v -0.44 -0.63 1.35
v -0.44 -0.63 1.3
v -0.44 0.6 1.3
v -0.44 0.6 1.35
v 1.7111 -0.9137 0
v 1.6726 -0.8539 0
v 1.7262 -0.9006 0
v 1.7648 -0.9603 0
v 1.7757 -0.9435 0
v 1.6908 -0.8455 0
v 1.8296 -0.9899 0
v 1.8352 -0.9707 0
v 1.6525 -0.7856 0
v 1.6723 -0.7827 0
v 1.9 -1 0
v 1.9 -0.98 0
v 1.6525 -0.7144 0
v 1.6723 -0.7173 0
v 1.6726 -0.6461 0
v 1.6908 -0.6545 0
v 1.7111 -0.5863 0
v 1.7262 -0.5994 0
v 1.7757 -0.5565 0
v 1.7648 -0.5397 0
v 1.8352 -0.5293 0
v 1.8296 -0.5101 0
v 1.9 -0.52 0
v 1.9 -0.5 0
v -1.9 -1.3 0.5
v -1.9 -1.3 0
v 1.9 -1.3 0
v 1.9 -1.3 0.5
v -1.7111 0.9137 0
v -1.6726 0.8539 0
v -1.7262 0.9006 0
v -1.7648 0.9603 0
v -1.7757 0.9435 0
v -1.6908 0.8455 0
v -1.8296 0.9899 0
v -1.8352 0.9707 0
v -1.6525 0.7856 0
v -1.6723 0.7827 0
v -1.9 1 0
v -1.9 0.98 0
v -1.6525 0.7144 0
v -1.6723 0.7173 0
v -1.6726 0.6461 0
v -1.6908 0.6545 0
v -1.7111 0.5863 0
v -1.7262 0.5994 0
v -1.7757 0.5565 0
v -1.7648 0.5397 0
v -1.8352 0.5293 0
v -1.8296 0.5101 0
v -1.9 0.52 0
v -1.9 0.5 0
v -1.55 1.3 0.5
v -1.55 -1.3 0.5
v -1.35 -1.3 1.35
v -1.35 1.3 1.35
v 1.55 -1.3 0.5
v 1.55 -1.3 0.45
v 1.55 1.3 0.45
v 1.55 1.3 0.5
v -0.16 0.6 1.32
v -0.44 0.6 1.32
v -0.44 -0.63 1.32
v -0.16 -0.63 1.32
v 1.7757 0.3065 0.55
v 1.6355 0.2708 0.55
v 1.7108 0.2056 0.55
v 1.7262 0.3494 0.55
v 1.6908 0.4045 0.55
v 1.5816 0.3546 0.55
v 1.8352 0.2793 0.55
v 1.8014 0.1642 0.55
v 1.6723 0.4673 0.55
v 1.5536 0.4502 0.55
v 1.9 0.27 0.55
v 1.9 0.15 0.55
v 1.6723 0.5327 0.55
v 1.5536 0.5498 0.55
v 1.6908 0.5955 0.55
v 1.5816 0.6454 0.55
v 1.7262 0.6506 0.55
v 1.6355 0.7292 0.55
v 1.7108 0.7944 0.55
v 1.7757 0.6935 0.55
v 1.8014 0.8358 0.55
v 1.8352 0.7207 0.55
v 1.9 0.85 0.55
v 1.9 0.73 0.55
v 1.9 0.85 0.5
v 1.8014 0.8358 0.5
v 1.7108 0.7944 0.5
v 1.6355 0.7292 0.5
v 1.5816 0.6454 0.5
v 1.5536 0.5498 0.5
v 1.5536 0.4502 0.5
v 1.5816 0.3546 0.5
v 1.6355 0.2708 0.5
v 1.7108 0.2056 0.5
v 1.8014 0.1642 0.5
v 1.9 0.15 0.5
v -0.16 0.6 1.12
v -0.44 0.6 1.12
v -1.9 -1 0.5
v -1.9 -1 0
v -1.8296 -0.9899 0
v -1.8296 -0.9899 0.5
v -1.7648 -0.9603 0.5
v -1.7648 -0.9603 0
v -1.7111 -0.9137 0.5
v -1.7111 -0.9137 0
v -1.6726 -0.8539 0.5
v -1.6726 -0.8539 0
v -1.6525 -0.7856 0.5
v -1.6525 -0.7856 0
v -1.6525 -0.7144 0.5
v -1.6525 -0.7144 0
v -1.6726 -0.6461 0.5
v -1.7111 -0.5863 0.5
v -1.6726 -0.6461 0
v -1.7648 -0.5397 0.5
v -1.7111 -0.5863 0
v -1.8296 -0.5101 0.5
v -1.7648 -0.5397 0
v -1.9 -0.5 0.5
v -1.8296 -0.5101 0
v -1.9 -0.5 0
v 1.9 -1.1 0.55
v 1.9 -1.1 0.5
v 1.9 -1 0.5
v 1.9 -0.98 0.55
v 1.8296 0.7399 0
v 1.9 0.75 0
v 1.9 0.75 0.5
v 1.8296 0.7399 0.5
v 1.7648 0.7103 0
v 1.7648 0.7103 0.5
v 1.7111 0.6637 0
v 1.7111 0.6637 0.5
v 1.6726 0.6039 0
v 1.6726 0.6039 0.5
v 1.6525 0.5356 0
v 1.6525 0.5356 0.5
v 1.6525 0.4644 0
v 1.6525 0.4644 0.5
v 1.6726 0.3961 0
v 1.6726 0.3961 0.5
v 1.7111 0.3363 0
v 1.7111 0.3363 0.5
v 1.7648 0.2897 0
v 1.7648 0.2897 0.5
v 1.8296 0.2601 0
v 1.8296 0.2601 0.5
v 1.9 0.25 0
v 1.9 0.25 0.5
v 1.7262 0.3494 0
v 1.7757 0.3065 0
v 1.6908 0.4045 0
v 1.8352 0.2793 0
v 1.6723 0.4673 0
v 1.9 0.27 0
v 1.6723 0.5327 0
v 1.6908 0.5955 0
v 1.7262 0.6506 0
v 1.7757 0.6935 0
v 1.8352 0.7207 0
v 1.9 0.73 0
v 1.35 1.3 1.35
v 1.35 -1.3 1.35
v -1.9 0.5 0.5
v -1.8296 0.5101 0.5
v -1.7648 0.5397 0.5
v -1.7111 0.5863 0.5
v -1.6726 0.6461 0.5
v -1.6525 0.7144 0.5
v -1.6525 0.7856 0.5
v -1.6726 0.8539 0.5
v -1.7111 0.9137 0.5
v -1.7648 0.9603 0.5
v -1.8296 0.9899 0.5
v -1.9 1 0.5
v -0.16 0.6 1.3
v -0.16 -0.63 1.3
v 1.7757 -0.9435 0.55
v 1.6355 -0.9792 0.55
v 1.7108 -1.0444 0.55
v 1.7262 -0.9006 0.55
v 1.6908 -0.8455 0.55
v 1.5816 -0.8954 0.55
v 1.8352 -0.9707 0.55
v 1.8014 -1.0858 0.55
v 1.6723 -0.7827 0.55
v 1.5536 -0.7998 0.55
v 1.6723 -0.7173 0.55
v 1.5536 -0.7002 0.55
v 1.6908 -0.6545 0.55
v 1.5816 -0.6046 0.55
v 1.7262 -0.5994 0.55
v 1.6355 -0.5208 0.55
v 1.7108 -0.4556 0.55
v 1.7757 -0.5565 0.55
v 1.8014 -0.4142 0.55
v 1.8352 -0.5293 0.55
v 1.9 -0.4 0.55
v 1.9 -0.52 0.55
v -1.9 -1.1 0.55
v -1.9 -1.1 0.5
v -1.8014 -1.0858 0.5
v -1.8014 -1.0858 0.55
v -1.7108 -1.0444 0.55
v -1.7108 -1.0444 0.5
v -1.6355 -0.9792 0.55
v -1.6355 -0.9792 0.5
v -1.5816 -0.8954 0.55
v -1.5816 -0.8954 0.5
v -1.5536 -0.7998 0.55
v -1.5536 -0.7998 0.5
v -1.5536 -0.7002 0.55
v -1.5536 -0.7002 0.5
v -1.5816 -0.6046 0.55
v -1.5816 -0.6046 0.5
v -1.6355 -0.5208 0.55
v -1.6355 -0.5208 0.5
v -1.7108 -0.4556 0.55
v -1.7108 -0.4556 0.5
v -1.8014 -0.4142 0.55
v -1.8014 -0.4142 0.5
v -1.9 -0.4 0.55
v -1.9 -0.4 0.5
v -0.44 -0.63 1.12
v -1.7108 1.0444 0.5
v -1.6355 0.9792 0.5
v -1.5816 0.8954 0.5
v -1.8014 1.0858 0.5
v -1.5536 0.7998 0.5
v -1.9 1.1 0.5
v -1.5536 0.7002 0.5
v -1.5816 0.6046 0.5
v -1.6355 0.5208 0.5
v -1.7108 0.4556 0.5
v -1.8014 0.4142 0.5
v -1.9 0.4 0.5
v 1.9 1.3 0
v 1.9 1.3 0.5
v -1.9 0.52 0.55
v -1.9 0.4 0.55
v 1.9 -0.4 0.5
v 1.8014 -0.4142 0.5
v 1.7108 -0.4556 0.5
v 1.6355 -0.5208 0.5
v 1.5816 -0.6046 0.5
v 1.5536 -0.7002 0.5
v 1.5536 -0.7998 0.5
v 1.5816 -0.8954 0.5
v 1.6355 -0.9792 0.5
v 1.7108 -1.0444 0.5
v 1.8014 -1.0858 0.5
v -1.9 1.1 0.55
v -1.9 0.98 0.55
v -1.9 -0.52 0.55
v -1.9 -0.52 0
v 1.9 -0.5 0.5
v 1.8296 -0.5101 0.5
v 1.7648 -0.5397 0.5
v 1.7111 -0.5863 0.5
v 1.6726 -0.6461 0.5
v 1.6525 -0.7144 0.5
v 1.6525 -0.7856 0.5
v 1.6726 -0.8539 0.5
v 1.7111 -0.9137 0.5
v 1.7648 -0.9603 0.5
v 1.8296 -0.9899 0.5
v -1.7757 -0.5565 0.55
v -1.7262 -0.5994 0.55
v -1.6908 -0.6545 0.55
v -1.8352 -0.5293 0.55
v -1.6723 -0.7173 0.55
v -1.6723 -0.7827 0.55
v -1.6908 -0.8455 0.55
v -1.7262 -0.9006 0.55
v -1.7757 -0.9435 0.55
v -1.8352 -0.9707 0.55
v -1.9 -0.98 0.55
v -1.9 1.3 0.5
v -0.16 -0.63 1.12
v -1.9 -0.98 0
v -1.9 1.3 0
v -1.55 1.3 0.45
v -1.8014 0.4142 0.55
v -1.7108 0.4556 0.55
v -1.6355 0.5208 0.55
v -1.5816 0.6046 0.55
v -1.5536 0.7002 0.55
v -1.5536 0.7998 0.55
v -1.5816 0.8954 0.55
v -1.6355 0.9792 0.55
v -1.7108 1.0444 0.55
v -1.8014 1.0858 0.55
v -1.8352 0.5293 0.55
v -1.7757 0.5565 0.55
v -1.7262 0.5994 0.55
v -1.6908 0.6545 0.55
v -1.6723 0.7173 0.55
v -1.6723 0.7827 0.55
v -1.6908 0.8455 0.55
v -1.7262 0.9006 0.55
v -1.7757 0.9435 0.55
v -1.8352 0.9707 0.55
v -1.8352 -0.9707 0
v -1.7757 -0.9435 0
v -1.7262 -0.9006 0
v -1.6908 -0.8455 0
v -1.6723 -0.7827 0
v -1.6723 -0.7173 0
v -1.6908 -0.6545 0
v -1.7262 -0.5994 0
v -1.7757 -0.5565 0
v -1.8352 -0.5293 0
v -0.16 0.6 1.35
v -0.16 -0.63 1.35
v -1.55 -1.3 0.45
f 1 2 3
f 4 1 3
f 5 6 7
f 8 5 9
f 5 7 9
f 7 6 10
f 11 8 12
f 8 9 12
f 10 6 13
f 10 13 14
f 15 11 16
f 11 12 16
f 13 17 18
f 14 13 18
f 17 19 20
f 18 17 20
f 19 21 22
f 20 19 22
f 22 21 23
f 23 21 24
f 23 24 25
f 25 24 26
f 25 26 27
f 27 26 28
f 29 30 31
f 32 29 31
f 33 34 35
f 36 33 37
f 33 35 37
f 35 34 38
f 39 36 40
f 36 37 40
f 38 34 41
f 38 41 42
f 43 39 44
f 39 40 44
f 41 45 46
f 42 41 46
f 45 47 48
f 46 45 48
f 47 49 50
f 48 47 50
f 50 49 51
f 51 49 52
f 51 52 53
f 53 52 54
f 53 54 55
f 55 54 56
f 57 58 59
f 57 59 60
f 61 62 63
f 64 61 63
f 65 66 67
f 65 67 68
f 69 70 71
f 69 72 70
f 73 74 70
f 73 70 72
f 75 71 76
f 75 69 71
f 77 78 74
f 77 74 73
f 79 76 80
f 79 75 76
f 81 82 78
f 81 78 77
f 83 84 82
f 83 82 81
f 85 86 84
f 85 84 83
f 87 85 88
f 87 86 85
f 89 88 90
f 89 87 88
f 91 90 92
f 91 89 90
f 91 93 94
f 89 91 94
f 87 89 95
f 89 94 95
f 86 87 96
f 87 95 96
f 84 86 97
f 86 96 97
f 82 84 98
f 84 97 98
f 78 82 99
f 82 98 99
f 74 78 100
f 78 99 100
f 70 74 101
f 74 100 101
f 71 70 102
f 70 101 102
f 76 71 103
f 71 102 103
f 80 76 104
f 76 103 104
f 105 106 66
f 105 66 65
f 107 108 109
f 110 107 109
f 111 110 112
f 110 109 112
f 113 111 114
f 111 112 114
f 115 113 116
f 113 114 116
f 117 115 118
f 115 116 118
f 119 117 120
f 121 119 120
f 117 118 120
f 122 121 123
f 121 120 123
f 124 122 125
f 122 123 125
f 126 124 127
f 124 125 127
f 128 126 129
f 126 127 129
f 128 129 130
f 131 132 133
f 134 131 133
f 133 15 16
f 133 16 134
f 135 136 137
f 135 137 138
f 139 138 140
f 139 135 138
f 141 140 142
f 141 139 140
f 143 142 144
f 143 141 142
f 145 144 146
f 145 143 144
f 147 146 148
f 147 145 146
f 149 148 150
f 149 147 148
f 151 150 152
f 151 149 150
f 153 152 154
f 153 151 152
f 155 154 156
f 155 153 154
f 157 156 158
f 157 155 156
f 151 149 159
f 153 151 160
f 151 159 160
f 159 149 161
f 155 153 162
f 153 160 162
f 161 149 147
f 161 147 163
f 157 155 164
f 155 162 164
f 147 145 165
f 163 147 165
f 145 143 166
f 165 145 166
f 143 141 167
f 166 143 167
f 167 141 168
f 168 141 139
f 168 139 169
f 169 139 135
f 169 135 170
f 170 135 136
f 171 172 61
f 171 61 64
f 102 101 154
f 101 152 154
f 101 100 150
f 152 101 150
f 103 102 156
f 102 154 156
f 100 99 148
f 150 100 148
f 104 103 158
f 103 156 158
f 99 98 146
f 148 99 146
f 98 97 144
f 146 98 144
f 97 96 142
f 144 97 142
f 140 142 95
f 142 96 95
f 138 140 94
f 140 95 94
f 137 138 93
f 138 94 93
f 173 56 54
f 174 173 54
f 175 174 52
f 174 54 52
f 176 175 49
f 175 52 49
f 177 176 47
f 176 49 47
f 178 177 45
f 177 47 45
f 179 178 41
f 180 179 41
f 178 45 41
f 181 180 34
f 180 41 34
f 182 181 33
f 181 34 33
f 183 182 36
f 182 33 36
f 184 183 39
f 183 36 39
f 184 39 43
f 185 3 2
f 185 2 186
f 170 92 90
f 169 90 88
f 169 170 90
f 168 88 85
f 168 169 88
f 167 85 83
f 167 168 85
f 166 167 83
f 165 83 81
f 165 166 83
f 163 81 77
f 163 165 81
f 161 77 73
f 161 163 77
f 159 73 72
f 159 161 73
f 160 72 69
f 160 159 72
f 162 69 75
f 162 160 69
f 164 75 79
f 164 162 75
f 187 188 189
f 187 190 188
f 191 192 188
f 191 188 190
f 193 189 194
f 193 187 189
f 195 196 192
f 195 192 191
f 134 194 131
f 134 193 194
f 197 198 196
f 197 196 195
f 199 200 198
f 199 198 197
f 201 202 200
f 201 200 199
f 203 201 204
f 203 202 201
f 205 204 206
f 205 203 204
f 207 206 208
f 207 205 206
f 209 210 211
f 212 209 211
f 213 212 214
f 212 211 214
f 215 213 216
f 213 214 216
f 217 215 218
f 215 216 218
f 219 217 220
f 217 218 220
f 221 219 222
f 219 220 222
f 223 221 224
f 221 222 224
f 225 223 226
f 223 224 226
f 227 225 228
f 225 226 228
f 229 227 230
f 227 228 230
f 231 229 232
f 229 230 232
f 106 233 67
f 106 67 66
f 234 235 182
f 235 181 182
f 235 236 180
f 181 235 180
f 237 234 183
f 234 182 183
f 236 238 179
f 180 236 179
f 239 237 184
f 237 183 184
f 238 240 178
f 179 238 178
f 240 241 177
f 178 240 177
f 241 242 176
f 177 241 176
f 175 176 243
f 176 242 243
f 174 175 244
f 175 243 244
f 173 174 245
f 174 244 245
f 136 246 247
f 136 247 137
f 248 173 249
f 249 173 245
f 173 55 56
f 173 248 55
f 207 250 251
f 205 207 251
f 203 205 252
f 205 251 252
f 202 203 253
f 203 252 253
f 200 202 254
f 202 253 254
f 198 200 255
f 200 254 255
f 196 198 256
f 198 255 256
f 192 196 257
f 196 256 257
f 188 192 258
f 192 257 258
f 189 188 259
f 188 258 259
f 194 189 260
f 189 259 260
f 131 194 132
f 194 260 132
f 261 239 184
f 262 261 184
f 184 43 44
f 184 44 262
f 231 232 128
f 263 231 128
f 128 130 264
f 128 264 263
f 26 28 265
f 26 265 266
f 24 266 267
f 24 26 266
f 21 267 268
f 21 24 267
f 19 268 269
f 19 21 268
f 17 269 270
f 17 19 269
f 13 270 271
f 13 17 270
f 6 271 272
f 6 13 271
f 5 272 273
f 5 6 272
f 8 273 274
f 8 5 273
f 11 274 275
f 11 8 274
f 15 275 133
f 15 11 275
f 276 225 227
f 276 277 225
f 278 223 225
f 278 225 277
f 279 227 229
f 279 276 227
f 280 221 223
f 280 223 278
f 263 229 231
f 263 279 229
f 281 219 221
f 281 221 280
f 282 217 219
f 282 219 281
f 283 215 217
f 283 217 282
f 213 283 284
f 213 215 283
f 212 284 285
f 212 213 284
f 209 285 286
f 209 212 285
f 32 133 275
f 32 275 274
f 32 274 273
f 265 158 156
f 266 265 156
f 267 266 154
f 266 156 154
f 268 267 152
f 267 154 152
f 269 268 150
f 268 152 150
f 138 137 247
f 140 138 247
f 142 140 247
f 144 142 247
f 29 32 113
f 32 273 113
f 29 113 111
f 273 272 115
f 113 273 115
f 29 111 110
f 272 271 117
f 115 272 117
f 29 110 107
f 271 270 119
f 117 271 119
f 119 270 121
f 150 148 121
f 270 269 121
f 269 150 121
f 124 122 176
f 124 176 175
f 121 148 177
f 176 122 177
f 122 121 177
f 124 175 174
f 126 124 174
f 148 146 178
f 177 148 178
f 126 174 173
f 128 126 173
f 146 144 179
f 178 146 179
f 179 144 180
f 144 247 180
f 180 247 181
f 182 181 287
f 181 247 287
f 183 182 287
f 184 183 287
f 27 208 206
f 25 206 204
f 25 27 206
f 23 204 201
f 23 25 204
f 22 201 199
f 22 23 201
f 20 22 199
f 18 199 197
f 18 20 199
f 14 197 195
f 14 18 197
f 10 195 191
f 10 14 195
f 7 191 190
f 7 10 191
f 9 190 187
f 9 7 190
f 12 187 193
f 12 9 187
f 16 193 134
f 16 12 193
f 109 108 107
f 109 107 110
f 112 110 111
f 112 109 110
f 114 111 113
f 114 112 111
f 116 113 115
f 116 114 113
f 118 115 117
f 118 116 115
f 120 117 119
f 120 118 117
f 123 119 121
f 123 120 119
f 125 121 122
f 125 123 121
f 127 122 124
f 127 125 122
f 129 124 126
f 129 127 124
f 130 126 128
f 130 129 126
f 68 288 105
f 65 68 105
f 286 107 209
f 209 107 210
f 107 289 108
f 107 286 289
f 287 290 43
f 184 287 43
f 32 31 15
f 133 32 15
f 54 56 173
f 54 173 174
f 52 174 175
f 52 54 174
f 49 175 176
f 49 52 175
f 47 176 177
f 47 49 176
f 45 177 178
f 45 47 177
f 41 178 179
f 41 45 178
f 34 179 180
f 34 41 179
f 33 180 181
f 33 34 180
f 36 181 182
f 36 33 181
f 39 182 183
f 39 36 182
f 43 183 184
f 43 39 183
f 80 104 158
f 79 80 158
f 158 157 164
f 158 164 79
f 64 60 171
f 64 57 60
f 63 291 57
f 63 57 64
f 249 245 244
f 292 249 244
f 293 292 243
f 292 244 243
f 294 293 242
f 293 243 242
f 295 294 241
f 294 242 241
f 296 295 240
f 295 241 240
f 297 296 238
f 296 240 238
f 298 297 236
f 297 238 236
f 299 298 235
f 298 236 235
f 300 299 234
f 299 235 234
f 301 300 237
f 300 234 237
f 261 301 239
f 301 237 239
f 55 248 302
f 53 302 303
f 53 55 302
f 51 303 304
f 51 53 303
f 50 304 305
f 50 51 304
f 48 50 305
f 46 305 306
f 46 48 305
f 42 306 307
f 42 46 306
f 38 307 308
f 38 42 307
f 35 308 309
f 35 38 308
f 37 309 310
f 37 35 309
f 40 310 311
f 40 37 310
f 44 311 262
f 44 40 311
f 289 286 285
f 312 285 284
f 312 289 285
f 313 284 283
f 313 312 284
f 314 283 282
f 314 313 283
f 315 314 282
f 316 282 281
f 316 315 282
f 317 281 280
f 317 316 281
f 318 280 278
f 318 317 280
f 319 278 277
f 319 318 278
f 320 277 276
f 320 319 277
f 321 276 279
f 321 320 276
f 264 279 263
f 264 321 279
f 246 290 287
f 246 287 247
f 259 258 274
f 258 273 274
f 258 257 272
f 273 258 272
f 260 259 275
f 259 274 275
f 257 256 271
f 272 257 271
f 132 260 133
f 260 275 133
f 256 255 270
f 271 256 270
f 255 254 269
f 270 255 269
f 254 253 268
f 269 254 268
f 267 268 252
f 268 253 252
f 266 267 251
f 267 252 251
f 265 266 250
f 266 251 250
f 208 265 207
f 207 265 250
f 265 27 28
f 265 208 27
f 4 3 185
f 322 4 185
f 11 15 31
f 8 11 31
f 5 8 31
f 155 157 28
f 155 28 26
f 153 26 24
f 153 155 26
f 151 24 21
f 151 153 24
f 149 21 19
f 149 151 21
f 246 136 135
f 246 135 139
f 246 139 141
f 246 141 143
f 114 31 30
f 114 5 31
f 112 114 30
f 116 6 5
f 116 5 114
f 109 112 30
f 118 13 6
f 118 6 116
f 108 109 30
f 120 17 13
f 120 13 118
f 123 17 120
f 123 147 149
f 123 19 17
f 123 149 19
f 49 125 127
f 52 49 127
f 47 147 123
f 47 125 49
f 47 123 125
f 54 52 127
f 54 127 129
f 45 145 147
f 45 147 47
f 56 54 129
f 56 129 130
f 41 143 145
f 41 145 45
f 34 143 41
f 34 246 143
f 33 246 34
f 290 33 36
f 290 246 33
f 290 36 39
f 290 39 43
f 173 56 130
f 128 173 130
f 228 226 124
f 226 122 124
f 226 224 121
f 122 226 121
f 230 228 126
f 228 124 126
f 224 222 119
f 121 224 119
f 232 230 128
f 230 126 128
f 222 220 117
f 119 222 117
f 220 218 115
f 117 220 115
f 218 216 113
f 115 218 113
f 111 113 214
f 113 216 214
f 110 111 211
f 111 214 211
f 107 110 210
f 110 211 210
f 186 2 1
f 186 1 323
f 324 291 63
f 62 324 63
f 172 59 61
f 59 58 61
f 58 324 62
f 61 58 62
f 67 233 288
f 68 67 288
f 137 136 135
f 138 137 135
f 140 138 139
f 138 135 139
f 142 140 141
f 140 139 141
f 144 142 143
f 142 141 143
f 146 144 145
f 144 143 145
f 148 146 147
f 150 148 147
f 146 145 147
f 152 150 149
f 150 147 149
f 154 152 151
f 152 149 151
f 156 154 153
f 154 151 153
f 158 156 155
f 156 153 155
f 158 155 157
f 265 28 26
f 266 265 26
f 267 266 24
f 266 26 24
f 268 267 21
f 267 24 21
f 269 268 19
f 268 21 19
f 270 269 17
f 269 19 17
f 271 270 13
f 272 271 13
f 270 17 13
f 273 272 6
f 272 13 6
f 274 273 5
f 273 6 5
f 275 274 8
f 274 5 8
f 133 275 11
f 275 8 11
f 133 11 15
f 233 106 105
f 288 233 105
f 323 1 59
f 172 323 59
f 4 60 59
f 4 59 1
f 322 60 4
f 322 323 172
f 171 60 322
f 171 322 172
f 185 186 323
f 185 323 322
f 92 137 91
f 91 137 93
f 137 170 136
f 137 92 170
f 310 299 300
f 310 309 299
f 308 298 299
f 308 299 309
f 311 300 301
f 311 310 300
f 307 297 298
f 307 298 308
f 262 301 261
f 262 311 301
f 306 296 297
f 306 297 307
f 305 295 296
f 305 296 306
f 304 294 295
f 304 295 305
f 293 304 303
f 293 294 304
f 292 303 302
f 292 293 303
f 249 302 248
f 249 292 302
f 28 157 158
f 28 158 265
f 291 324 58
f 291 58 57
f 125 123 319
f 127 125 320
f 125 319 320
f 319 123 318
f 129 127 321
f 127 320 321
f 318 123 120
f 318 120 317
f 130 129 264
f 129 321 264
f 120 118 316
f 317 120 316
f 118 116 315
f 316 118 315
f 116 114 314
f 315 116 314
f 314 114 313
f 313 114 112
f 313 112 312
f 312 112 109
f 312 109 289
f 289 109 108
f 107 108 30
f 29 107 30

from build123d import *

# Parameters (mm, degrees)
PAD_DEPTH              = 0.5
BOX002_W               = 0.28
BOX002_H               = 1.23
BOX002_DEPTH           = 0.2
BOX003_W               = 1
BOX003_H               = 1
BOX003_DEPTH           = 0.7
CYLINDER001_R          = 0.23
CYLINDER001_DEPTH      = 0.55
CYLINDER_R             = 0.25
CYLINDER_DEPTH         = 0.55
CYLINDER002_R          = 0.25
CYLINDER002_DEPTH      = 0.05
CYLINDER003_R          = 0.35
CYLINDER003_DEPTH      = 0.05
BOX004_W               = 1
BOX004_H               = 1
BOX004_DEPTH           = 0.7
CYLINDER005_R          = 0.23
CYLINDER005_DEPTH      = 0.55
CYLINDER004_R          = 0.25
CYLINDER004_DEPTH      = 0.55
CYLINDER006_R          = 0.25
CYLINDER006_DEPTH      = 0.05
CYLINDER007_R          = 0.35
CYLINDER007_DEPTH      = 0.05
BOX005_W               = 1
BOX005_H               = 1
BOX005_DEPTH           = 0.7
CYLINDER009_R          = 0.23
CYLINDER009_DEPTH      = 0.55
CYLINDER008_R          = 0.25
CYLINDER008_DEPTH      = 0.55
CYLINDER010_R          = 0.25
CYLINDER010_DEPTH      = 0.05
CYLINDER011_R          = 0.35
CYLINDER011_DEPTH      = 0.05
CUT009_PLACEMENT_ANGLE = 180
BOX006_W               = 1
BOX006_H               = 1
BOX006_DEPTH           = 0.7
CYLINDER013_R          = 0.23
CYLINDER013_DEPTH      = 0.55
CYLINDER012_R          = 0.25
CYLINDER012_DEPTH      = 0.55
CYLINDER014_R          = 0.25
CYLINDER014_DEPTH      = 0.05
CYLINDER015_R          = 0.35
CYLINDER015_DEPTH      = 0.05
CUT012_PLACEMENT_ANGLE = 180
BOX001_W               = 0.28
BOX001_H               = 1.23
BOX001_DEPTH           = 0.2
BOX_W                  = 3.1
BOX_H                  = 2.6
BOX_DEPTH              = 0.9
CHAMFER_SIZE2          = 0.2
CHAMFER_SIZE           = 0.85
CHAMFER001_SIZE2       = 0.85
CHAMFER001_SIZE        = 0.2


with BuildPart() as body:
    # Sketch → Pad (new body)
    with BuildSketch(Plane.XY):
        with BuildLine():
            Line((-1.9, 1.3), (1.9, 1.3))
            Line((1.9, 1.3), (1.9, 0.75))
            ThreePointArc((1.9, 0.75), (1.65, 0.5), (1.9, 0.25))
            Line((1.9, 0.25), (1.9, -0.5))
            ThreePointArc((1.9, -0.5), (1.65, -0.75), (1.9, -1))
            Line((1.9, -1.3), (1.9, -1))
            Line((-1.9, -1.3), (1.9, -1.3))
            Line((-1.9, -1), (-1.9, -1.3))
            ThreePointArc((-1.9, -1), (-1.65, -0.75), (-1.9, -0.5))
            Line((-1.9, 0.5), (-1.9, -0.5))
            ThreePointArc((-1.9, 0.5), (-1.65, 0.75), (-1.9, 1))
            Line((-1.9, 1.3), (-1.9, 1))
        make_face()
    extrude(amount=PAD_DEPTH)


with BuildPart() as kub002:
    # Box002 → Box002 (new body)
    with BuildSketch(Plane(origin=(-0.44, -0.63, 1.12), x_dir=(1, 0, 0), z_dir=(0, 0, 1))):
        with Locations((0.14, 0.615)):
            Rectangle(BOX002_W, BOX002_H)
    extrude(amount=BOX002_DEPTH)


with BuildPart() as kub003:
    # Box003 → Box003 (new body)
    with BuildSketch(Plane(origin=(1.9, -1.2, 0), x_dir=(1, 0, 0), z_dir=(0, 0, 1))):
        with Locations((0.5, 0.5)):
            Rectangle(BOX003_W, BOX003_H)
    extrude(amount=BOX003_DEPTH)


with BuildPart() as cylinder001:
    # Cylinder001 → Cylinder001 (new body)
    with BuildSketch(Plane(origin=(1.9, -0.75, 0), x_dir=(1, 0, 0), z_dir=(0, 0, 1))):
        Circle(CYLINDER001_R)
    extrude(amount=CYLINDER001_DEPTH)


with BuildPart() as cut002:
    # Cylinder → Cylinder (new body)
    with BuildSketch(Plane(origin=(1.9, -0.75, 0), x_dir=(1, 0, 0), z_dir=(0, 0, 1))):
        Circle(CYLINDER_R)
    extrude(amount=CYLINDER_DEPTH)

    # Cut002: cut Cylinder001
    add(cylinder001.part, mode=Mode.SUBTRACT)


with BuildPart() as cylinder002:
    # Cylinder002 → Cylinder002 (new body)
    with BuildSketch(Plane(origin=(1.9, -0.75, 0.5), x_dir=(1, 0, 0), z_dir=(0, 0, 1))):
        Circle(CYLINDER002_R)
    extrude(amount=CYLINDER002_DEPTH)


with BuildPart() as pin001:
    # Cylinder003 → Cylinder003 (new body)
    with BuildSketch(Plane(origin=(1.9, -0.75, 0.5), x_dir=(1, 0, 0), z_dir=(0, 0, 1))):
        Circle(CYLINDER003_R)
    extrude(amount=CYLINDER003_DEPTH)

    # Cut001: cut Cylinder002
    add(cylinder002.part, mode=Mode.SUBTRACT)

    # Fusion001: union Cut002
    add(cut002.part)

    # Cut003: cut Kub003
    add(kub003.part, mode=Mode.SUBTRACT)


with BuildPart() as kub004:
    # Box004 → Box004 (new body)
    with BuildSketch(Plane(origin=(1.9, -1.2, 0), x_dir=(1, 0, 0), z_dir=(0, 0, 1))):
        with Locations((0.5, 0.5)):
            Rectangle(BOX004_W, BOX004_H)
    extrude(amount=BOX004_DEPTH)


with BuildPart() as cylinder005:
    # Cylinder005 → Cylinder005 (new body)
    with BuildSketch(Plane(origin=(1.9, -0.75, 0), x_dir=(1, 0, 0), z_dir=(0, 0, 1))):
        Circle(CYLINDER005_R)
    extrude(amount=CYLINDER005_DEPTH)


with BuildPart() as cut005:
    # Cylinder004 → Cylinder004 (new body)
    with BuildSketch(Plane(origin=(1.9, -0.75, 0), x_dir=(1, 0, 0), z_dir=(0, 0, 1))):
        Circle(CYLINDER004_R)
    extrude(amount=CYLINDER004_DEPTH)

    # Cut005: cut Cylinder005
    add(cylinder005.part, mode=Mode.SUBTRACT)


with BuildPart() as cylinder006:
    # Cylinder006 → Cylinder006 (new body)
    with BuildSketch(Plane(origin=(1.9, -0.75, 0.5), x_dir=(1, 0, 0), z_dir=(0, 0, 1))):
        Circle(CYLINDER006_R)
    extrude(amount=CYLINDER006_DEPTH)


with BuildPart() as pin002:
    # Cylinder007 → Cylinder007 (new body)
    with BuildSketch(Plane(origin=(1.9, -0.75, 0.5), x_dir=(1, 0, 0), z_dir=(0, 0, 1))):
        Circle(CYLINDER007_R)
    extrude(amount=CYLINDER007_DEPTH)

    # Cut004: cut Cylinder006
    add(cylinder006.part, mode=Mode.SUBTRACT)

    # Fusion002: union Cut005
    add(cut005.part)

    # Cut006: cut Kub004
    add(kub004.part, mode=Mode.SUBTRACT)


with BuildPart() as pin002_1:
    # Cut006 placement: moved
    add(pin002.part.moved(Location((0, 1.25, 0))))


with BuildPart() as kub005:
    # Box005 → Box005 (new body)
    with BuildSketch(Plane(origin=(1.9, -1.2, 0), x_dir=(1, 0, 0), z_dir=(0, 0, 1))):
        with Locations((0.5, 0.5)):
            Rectangle(BOX005_W, BOX005_H)
    extrude(amount=BOX005_DEPTH)


with BuildPart() as cylinder009:
    # Cylinder009 → Cylinder009 (new body)
    with BuildSketch(Plane(origin=(1.9, -0.75, 0), x_dir=(1, 0, 0), z_dir=(0, 0, 1))):
        Circle(CYLINDER009_R)
    extrude(amount=CYLINDER009_DEPTH)


with BuildPart() as cut008:
    # Cylinder008 → Cylinder008 (new body)
    with BuildSketch(Plane(origin=(1.9, -0.75, 0), x_dir=(1, 0, 0), z_dir=(0, 0, 1))):
        Circle(CYLINDER008_R)
    extrude(amount=CYLINDER008_DEPTH)

    # Cut008: cut Cylinder009
    add(cylinder009.part, mode=Mode.SUBTRACT)


with BuildPart() as cylinder010:
    # Cylinder010 → Cylinder010 (new body)
    with BuildSketch(Plane(origin=(1.9, -0.75, 0.5), x_dir=(1, 0, 0), z_dir=(0, 0, 1))):
        Circle(CYLINDER010_R)
    extrude(amount=CYLINDER010_DEPTH)


with BuildPart() as pin003:
    # Cylinder011 → Cylinder011 (new body)
    with BuildSketch(Plane(origin=(1.9, -0.75, 0.5), x_dir=(1, 0, 0), z_dir=(0, 0, 1))):
        Circle(CYLINDER011_R)
    extrude(amount=CYLINDER011_DEPTH)

    # Cut007: cut Cylinder010
    add(cylinder010.part, mode=Mode.SUBTRACT)

    # Fusion003: union Cut008
    add(cut008.part)

    # Cut009: cut Kub005
    add(kub005.part, mode=Mode.SUBTRACT)


with BuildPart() as pin003_1:
    # Cut009 placement: moved
    add(pin003.part.rotate(Axis((0, 0, 0), (0, 0, 1)), CUT009_PLACEMENT_ANGLE))


with BuildPart() as kub006:
    # Box006 → Box006 (new body)
    with BuildSketch(Plane(origin=(1.9, -1.2, 0), x_dir=(1, 0, 0), z_dir=(0, 0, 1))):
        with Locations((0.5, 0.5)):
            Rectangle(BOX006_W, BOX006_H)
    extrude(amount=BOX006_DEPTH)


with BuildPart() as cylinder013:
    # Cylinder013 → Cylinder013 (new body)
    with BuildSketch(Plane(origin=(1.9, -0.75, 0), x_dir=(1, 0, 0), z_dir=(0, 0, 1))):
        Circle(CYLINDER013_R)
    extrude(amount=CYLINDER013_DEPTH)


with BuildPart() as cut011:
    # Cylinder012 → Cylinder012 (new body)
    with BuildSketch(Plane(origin=(1.9, -0.75, 0), x_dir=(1, 0, 0), z_dir=(0, 0, 1))):
        Circle(CYLINDER012_R)
    extrude(amount=CYLINDER012_DEPTH)

    # Cut011: cut Cylinder013
    add(cylinder013.part, mode=Mode.SUBTRACT)


with BuildPart() as cylinder014:
    # Cylinder014 → Cylinder014 (new body)
    with BuildSketch(Plane(origin=(1.9, -0.75, 0.5), x_dir=(1, 0, 0), z_dir=(0, 0, 1))):
        Circle(CYLINDER014_R)
    extrude(amount=CYLINDER014_DEPTH)


with BuildPart() as pin004:
    # Cylinder015 → Cylinder015 (new body)
    with BuildSketch(Plane(origin=(1.9, -0.75, 0.5), x_dir=(1, 0, 0), z_dir=(0, 0, 1))):
        Circle(CYLINDER015_R)
    extrude(amount=CYLINDER015_DEPTH)

    # Cut010: cut Cylinder014
    add(cylinder014.part, mode=Mode.SUBTRACT)

    # Fusion004: union Cut011
    add(cut011.part)

    # Cut012: cut Kub006
    add(kub006.part, mode=Mode.SUBTRACT)


with BuildPart() as pin004_1:
    # Cut012 placement: moved
    add(pin004.part.moved(Location((0, -1.5, 0))).rotate(Axis((0, -1.5, 0), (0, 0, 1)), CUT012_PLACEMENT_ANGLE))


with BuildPart() as kub001:
    # Box001 → Box001 (new body)
    with BuildSketch(Plane(origin=(-0.44, -0.63, 1.3), x_dir=(1, 0, 0), z_dir=(0, 0, 1))):
        with Locations((0.14, 0.615)):
            Rectangle(BOX001_W, BOX001_H)
    extrude(amount=BOX001_DEPTH)


with BuildPart() as cut:
    # Box → Box (new body)
    with BuildSketch(Plane(origin=(-1.55, -1.3, 0.45), x_dir=(1, 0, 0), z_dir=(0, 0, 1))):
        with Locations((1.55, 1.3)):
            Rectangle(BOX_W, BOX_H)
    extrude(amount=BOX_DEPTH)

    # Chamfer
    chamfer_edges = [cut.edges().sort_by_distance(p)[0] for p in [
        (1.55, 0, 1.35),
    ]]
    chamfer_side = cut.faces().sort_by_distance((1.55, 0, 0.9))[0]
    chamfer(chamfer_edges, length=CHAMFER_SIZE, length2=CHAMFER_SIZE2, reference=chamfer_side)

    # Chamfer001
    chamfer001_edges = [cut.edges().sort_by_distance(p)[0] for p in [
        (-1.55, 0, 1.35),
    ]]
    chamfer001_side = cut.faces().sort_by_distance((-0.1, 0, 1.35))[0]
    chamfer(chamfer001_edges, length=CHAMFER001_SIZE, length2=CHAMFER001_SIZE2, reference=chamfer001_side)

    # Cut: cut Kub001
    add(kub001.part, mode=Mode.SUBTRACT)


solid = Compound([body.part, kub002.part, pin001.part, pin002_1.part, pin003_1.part, pin004_1.part, cut.part])
